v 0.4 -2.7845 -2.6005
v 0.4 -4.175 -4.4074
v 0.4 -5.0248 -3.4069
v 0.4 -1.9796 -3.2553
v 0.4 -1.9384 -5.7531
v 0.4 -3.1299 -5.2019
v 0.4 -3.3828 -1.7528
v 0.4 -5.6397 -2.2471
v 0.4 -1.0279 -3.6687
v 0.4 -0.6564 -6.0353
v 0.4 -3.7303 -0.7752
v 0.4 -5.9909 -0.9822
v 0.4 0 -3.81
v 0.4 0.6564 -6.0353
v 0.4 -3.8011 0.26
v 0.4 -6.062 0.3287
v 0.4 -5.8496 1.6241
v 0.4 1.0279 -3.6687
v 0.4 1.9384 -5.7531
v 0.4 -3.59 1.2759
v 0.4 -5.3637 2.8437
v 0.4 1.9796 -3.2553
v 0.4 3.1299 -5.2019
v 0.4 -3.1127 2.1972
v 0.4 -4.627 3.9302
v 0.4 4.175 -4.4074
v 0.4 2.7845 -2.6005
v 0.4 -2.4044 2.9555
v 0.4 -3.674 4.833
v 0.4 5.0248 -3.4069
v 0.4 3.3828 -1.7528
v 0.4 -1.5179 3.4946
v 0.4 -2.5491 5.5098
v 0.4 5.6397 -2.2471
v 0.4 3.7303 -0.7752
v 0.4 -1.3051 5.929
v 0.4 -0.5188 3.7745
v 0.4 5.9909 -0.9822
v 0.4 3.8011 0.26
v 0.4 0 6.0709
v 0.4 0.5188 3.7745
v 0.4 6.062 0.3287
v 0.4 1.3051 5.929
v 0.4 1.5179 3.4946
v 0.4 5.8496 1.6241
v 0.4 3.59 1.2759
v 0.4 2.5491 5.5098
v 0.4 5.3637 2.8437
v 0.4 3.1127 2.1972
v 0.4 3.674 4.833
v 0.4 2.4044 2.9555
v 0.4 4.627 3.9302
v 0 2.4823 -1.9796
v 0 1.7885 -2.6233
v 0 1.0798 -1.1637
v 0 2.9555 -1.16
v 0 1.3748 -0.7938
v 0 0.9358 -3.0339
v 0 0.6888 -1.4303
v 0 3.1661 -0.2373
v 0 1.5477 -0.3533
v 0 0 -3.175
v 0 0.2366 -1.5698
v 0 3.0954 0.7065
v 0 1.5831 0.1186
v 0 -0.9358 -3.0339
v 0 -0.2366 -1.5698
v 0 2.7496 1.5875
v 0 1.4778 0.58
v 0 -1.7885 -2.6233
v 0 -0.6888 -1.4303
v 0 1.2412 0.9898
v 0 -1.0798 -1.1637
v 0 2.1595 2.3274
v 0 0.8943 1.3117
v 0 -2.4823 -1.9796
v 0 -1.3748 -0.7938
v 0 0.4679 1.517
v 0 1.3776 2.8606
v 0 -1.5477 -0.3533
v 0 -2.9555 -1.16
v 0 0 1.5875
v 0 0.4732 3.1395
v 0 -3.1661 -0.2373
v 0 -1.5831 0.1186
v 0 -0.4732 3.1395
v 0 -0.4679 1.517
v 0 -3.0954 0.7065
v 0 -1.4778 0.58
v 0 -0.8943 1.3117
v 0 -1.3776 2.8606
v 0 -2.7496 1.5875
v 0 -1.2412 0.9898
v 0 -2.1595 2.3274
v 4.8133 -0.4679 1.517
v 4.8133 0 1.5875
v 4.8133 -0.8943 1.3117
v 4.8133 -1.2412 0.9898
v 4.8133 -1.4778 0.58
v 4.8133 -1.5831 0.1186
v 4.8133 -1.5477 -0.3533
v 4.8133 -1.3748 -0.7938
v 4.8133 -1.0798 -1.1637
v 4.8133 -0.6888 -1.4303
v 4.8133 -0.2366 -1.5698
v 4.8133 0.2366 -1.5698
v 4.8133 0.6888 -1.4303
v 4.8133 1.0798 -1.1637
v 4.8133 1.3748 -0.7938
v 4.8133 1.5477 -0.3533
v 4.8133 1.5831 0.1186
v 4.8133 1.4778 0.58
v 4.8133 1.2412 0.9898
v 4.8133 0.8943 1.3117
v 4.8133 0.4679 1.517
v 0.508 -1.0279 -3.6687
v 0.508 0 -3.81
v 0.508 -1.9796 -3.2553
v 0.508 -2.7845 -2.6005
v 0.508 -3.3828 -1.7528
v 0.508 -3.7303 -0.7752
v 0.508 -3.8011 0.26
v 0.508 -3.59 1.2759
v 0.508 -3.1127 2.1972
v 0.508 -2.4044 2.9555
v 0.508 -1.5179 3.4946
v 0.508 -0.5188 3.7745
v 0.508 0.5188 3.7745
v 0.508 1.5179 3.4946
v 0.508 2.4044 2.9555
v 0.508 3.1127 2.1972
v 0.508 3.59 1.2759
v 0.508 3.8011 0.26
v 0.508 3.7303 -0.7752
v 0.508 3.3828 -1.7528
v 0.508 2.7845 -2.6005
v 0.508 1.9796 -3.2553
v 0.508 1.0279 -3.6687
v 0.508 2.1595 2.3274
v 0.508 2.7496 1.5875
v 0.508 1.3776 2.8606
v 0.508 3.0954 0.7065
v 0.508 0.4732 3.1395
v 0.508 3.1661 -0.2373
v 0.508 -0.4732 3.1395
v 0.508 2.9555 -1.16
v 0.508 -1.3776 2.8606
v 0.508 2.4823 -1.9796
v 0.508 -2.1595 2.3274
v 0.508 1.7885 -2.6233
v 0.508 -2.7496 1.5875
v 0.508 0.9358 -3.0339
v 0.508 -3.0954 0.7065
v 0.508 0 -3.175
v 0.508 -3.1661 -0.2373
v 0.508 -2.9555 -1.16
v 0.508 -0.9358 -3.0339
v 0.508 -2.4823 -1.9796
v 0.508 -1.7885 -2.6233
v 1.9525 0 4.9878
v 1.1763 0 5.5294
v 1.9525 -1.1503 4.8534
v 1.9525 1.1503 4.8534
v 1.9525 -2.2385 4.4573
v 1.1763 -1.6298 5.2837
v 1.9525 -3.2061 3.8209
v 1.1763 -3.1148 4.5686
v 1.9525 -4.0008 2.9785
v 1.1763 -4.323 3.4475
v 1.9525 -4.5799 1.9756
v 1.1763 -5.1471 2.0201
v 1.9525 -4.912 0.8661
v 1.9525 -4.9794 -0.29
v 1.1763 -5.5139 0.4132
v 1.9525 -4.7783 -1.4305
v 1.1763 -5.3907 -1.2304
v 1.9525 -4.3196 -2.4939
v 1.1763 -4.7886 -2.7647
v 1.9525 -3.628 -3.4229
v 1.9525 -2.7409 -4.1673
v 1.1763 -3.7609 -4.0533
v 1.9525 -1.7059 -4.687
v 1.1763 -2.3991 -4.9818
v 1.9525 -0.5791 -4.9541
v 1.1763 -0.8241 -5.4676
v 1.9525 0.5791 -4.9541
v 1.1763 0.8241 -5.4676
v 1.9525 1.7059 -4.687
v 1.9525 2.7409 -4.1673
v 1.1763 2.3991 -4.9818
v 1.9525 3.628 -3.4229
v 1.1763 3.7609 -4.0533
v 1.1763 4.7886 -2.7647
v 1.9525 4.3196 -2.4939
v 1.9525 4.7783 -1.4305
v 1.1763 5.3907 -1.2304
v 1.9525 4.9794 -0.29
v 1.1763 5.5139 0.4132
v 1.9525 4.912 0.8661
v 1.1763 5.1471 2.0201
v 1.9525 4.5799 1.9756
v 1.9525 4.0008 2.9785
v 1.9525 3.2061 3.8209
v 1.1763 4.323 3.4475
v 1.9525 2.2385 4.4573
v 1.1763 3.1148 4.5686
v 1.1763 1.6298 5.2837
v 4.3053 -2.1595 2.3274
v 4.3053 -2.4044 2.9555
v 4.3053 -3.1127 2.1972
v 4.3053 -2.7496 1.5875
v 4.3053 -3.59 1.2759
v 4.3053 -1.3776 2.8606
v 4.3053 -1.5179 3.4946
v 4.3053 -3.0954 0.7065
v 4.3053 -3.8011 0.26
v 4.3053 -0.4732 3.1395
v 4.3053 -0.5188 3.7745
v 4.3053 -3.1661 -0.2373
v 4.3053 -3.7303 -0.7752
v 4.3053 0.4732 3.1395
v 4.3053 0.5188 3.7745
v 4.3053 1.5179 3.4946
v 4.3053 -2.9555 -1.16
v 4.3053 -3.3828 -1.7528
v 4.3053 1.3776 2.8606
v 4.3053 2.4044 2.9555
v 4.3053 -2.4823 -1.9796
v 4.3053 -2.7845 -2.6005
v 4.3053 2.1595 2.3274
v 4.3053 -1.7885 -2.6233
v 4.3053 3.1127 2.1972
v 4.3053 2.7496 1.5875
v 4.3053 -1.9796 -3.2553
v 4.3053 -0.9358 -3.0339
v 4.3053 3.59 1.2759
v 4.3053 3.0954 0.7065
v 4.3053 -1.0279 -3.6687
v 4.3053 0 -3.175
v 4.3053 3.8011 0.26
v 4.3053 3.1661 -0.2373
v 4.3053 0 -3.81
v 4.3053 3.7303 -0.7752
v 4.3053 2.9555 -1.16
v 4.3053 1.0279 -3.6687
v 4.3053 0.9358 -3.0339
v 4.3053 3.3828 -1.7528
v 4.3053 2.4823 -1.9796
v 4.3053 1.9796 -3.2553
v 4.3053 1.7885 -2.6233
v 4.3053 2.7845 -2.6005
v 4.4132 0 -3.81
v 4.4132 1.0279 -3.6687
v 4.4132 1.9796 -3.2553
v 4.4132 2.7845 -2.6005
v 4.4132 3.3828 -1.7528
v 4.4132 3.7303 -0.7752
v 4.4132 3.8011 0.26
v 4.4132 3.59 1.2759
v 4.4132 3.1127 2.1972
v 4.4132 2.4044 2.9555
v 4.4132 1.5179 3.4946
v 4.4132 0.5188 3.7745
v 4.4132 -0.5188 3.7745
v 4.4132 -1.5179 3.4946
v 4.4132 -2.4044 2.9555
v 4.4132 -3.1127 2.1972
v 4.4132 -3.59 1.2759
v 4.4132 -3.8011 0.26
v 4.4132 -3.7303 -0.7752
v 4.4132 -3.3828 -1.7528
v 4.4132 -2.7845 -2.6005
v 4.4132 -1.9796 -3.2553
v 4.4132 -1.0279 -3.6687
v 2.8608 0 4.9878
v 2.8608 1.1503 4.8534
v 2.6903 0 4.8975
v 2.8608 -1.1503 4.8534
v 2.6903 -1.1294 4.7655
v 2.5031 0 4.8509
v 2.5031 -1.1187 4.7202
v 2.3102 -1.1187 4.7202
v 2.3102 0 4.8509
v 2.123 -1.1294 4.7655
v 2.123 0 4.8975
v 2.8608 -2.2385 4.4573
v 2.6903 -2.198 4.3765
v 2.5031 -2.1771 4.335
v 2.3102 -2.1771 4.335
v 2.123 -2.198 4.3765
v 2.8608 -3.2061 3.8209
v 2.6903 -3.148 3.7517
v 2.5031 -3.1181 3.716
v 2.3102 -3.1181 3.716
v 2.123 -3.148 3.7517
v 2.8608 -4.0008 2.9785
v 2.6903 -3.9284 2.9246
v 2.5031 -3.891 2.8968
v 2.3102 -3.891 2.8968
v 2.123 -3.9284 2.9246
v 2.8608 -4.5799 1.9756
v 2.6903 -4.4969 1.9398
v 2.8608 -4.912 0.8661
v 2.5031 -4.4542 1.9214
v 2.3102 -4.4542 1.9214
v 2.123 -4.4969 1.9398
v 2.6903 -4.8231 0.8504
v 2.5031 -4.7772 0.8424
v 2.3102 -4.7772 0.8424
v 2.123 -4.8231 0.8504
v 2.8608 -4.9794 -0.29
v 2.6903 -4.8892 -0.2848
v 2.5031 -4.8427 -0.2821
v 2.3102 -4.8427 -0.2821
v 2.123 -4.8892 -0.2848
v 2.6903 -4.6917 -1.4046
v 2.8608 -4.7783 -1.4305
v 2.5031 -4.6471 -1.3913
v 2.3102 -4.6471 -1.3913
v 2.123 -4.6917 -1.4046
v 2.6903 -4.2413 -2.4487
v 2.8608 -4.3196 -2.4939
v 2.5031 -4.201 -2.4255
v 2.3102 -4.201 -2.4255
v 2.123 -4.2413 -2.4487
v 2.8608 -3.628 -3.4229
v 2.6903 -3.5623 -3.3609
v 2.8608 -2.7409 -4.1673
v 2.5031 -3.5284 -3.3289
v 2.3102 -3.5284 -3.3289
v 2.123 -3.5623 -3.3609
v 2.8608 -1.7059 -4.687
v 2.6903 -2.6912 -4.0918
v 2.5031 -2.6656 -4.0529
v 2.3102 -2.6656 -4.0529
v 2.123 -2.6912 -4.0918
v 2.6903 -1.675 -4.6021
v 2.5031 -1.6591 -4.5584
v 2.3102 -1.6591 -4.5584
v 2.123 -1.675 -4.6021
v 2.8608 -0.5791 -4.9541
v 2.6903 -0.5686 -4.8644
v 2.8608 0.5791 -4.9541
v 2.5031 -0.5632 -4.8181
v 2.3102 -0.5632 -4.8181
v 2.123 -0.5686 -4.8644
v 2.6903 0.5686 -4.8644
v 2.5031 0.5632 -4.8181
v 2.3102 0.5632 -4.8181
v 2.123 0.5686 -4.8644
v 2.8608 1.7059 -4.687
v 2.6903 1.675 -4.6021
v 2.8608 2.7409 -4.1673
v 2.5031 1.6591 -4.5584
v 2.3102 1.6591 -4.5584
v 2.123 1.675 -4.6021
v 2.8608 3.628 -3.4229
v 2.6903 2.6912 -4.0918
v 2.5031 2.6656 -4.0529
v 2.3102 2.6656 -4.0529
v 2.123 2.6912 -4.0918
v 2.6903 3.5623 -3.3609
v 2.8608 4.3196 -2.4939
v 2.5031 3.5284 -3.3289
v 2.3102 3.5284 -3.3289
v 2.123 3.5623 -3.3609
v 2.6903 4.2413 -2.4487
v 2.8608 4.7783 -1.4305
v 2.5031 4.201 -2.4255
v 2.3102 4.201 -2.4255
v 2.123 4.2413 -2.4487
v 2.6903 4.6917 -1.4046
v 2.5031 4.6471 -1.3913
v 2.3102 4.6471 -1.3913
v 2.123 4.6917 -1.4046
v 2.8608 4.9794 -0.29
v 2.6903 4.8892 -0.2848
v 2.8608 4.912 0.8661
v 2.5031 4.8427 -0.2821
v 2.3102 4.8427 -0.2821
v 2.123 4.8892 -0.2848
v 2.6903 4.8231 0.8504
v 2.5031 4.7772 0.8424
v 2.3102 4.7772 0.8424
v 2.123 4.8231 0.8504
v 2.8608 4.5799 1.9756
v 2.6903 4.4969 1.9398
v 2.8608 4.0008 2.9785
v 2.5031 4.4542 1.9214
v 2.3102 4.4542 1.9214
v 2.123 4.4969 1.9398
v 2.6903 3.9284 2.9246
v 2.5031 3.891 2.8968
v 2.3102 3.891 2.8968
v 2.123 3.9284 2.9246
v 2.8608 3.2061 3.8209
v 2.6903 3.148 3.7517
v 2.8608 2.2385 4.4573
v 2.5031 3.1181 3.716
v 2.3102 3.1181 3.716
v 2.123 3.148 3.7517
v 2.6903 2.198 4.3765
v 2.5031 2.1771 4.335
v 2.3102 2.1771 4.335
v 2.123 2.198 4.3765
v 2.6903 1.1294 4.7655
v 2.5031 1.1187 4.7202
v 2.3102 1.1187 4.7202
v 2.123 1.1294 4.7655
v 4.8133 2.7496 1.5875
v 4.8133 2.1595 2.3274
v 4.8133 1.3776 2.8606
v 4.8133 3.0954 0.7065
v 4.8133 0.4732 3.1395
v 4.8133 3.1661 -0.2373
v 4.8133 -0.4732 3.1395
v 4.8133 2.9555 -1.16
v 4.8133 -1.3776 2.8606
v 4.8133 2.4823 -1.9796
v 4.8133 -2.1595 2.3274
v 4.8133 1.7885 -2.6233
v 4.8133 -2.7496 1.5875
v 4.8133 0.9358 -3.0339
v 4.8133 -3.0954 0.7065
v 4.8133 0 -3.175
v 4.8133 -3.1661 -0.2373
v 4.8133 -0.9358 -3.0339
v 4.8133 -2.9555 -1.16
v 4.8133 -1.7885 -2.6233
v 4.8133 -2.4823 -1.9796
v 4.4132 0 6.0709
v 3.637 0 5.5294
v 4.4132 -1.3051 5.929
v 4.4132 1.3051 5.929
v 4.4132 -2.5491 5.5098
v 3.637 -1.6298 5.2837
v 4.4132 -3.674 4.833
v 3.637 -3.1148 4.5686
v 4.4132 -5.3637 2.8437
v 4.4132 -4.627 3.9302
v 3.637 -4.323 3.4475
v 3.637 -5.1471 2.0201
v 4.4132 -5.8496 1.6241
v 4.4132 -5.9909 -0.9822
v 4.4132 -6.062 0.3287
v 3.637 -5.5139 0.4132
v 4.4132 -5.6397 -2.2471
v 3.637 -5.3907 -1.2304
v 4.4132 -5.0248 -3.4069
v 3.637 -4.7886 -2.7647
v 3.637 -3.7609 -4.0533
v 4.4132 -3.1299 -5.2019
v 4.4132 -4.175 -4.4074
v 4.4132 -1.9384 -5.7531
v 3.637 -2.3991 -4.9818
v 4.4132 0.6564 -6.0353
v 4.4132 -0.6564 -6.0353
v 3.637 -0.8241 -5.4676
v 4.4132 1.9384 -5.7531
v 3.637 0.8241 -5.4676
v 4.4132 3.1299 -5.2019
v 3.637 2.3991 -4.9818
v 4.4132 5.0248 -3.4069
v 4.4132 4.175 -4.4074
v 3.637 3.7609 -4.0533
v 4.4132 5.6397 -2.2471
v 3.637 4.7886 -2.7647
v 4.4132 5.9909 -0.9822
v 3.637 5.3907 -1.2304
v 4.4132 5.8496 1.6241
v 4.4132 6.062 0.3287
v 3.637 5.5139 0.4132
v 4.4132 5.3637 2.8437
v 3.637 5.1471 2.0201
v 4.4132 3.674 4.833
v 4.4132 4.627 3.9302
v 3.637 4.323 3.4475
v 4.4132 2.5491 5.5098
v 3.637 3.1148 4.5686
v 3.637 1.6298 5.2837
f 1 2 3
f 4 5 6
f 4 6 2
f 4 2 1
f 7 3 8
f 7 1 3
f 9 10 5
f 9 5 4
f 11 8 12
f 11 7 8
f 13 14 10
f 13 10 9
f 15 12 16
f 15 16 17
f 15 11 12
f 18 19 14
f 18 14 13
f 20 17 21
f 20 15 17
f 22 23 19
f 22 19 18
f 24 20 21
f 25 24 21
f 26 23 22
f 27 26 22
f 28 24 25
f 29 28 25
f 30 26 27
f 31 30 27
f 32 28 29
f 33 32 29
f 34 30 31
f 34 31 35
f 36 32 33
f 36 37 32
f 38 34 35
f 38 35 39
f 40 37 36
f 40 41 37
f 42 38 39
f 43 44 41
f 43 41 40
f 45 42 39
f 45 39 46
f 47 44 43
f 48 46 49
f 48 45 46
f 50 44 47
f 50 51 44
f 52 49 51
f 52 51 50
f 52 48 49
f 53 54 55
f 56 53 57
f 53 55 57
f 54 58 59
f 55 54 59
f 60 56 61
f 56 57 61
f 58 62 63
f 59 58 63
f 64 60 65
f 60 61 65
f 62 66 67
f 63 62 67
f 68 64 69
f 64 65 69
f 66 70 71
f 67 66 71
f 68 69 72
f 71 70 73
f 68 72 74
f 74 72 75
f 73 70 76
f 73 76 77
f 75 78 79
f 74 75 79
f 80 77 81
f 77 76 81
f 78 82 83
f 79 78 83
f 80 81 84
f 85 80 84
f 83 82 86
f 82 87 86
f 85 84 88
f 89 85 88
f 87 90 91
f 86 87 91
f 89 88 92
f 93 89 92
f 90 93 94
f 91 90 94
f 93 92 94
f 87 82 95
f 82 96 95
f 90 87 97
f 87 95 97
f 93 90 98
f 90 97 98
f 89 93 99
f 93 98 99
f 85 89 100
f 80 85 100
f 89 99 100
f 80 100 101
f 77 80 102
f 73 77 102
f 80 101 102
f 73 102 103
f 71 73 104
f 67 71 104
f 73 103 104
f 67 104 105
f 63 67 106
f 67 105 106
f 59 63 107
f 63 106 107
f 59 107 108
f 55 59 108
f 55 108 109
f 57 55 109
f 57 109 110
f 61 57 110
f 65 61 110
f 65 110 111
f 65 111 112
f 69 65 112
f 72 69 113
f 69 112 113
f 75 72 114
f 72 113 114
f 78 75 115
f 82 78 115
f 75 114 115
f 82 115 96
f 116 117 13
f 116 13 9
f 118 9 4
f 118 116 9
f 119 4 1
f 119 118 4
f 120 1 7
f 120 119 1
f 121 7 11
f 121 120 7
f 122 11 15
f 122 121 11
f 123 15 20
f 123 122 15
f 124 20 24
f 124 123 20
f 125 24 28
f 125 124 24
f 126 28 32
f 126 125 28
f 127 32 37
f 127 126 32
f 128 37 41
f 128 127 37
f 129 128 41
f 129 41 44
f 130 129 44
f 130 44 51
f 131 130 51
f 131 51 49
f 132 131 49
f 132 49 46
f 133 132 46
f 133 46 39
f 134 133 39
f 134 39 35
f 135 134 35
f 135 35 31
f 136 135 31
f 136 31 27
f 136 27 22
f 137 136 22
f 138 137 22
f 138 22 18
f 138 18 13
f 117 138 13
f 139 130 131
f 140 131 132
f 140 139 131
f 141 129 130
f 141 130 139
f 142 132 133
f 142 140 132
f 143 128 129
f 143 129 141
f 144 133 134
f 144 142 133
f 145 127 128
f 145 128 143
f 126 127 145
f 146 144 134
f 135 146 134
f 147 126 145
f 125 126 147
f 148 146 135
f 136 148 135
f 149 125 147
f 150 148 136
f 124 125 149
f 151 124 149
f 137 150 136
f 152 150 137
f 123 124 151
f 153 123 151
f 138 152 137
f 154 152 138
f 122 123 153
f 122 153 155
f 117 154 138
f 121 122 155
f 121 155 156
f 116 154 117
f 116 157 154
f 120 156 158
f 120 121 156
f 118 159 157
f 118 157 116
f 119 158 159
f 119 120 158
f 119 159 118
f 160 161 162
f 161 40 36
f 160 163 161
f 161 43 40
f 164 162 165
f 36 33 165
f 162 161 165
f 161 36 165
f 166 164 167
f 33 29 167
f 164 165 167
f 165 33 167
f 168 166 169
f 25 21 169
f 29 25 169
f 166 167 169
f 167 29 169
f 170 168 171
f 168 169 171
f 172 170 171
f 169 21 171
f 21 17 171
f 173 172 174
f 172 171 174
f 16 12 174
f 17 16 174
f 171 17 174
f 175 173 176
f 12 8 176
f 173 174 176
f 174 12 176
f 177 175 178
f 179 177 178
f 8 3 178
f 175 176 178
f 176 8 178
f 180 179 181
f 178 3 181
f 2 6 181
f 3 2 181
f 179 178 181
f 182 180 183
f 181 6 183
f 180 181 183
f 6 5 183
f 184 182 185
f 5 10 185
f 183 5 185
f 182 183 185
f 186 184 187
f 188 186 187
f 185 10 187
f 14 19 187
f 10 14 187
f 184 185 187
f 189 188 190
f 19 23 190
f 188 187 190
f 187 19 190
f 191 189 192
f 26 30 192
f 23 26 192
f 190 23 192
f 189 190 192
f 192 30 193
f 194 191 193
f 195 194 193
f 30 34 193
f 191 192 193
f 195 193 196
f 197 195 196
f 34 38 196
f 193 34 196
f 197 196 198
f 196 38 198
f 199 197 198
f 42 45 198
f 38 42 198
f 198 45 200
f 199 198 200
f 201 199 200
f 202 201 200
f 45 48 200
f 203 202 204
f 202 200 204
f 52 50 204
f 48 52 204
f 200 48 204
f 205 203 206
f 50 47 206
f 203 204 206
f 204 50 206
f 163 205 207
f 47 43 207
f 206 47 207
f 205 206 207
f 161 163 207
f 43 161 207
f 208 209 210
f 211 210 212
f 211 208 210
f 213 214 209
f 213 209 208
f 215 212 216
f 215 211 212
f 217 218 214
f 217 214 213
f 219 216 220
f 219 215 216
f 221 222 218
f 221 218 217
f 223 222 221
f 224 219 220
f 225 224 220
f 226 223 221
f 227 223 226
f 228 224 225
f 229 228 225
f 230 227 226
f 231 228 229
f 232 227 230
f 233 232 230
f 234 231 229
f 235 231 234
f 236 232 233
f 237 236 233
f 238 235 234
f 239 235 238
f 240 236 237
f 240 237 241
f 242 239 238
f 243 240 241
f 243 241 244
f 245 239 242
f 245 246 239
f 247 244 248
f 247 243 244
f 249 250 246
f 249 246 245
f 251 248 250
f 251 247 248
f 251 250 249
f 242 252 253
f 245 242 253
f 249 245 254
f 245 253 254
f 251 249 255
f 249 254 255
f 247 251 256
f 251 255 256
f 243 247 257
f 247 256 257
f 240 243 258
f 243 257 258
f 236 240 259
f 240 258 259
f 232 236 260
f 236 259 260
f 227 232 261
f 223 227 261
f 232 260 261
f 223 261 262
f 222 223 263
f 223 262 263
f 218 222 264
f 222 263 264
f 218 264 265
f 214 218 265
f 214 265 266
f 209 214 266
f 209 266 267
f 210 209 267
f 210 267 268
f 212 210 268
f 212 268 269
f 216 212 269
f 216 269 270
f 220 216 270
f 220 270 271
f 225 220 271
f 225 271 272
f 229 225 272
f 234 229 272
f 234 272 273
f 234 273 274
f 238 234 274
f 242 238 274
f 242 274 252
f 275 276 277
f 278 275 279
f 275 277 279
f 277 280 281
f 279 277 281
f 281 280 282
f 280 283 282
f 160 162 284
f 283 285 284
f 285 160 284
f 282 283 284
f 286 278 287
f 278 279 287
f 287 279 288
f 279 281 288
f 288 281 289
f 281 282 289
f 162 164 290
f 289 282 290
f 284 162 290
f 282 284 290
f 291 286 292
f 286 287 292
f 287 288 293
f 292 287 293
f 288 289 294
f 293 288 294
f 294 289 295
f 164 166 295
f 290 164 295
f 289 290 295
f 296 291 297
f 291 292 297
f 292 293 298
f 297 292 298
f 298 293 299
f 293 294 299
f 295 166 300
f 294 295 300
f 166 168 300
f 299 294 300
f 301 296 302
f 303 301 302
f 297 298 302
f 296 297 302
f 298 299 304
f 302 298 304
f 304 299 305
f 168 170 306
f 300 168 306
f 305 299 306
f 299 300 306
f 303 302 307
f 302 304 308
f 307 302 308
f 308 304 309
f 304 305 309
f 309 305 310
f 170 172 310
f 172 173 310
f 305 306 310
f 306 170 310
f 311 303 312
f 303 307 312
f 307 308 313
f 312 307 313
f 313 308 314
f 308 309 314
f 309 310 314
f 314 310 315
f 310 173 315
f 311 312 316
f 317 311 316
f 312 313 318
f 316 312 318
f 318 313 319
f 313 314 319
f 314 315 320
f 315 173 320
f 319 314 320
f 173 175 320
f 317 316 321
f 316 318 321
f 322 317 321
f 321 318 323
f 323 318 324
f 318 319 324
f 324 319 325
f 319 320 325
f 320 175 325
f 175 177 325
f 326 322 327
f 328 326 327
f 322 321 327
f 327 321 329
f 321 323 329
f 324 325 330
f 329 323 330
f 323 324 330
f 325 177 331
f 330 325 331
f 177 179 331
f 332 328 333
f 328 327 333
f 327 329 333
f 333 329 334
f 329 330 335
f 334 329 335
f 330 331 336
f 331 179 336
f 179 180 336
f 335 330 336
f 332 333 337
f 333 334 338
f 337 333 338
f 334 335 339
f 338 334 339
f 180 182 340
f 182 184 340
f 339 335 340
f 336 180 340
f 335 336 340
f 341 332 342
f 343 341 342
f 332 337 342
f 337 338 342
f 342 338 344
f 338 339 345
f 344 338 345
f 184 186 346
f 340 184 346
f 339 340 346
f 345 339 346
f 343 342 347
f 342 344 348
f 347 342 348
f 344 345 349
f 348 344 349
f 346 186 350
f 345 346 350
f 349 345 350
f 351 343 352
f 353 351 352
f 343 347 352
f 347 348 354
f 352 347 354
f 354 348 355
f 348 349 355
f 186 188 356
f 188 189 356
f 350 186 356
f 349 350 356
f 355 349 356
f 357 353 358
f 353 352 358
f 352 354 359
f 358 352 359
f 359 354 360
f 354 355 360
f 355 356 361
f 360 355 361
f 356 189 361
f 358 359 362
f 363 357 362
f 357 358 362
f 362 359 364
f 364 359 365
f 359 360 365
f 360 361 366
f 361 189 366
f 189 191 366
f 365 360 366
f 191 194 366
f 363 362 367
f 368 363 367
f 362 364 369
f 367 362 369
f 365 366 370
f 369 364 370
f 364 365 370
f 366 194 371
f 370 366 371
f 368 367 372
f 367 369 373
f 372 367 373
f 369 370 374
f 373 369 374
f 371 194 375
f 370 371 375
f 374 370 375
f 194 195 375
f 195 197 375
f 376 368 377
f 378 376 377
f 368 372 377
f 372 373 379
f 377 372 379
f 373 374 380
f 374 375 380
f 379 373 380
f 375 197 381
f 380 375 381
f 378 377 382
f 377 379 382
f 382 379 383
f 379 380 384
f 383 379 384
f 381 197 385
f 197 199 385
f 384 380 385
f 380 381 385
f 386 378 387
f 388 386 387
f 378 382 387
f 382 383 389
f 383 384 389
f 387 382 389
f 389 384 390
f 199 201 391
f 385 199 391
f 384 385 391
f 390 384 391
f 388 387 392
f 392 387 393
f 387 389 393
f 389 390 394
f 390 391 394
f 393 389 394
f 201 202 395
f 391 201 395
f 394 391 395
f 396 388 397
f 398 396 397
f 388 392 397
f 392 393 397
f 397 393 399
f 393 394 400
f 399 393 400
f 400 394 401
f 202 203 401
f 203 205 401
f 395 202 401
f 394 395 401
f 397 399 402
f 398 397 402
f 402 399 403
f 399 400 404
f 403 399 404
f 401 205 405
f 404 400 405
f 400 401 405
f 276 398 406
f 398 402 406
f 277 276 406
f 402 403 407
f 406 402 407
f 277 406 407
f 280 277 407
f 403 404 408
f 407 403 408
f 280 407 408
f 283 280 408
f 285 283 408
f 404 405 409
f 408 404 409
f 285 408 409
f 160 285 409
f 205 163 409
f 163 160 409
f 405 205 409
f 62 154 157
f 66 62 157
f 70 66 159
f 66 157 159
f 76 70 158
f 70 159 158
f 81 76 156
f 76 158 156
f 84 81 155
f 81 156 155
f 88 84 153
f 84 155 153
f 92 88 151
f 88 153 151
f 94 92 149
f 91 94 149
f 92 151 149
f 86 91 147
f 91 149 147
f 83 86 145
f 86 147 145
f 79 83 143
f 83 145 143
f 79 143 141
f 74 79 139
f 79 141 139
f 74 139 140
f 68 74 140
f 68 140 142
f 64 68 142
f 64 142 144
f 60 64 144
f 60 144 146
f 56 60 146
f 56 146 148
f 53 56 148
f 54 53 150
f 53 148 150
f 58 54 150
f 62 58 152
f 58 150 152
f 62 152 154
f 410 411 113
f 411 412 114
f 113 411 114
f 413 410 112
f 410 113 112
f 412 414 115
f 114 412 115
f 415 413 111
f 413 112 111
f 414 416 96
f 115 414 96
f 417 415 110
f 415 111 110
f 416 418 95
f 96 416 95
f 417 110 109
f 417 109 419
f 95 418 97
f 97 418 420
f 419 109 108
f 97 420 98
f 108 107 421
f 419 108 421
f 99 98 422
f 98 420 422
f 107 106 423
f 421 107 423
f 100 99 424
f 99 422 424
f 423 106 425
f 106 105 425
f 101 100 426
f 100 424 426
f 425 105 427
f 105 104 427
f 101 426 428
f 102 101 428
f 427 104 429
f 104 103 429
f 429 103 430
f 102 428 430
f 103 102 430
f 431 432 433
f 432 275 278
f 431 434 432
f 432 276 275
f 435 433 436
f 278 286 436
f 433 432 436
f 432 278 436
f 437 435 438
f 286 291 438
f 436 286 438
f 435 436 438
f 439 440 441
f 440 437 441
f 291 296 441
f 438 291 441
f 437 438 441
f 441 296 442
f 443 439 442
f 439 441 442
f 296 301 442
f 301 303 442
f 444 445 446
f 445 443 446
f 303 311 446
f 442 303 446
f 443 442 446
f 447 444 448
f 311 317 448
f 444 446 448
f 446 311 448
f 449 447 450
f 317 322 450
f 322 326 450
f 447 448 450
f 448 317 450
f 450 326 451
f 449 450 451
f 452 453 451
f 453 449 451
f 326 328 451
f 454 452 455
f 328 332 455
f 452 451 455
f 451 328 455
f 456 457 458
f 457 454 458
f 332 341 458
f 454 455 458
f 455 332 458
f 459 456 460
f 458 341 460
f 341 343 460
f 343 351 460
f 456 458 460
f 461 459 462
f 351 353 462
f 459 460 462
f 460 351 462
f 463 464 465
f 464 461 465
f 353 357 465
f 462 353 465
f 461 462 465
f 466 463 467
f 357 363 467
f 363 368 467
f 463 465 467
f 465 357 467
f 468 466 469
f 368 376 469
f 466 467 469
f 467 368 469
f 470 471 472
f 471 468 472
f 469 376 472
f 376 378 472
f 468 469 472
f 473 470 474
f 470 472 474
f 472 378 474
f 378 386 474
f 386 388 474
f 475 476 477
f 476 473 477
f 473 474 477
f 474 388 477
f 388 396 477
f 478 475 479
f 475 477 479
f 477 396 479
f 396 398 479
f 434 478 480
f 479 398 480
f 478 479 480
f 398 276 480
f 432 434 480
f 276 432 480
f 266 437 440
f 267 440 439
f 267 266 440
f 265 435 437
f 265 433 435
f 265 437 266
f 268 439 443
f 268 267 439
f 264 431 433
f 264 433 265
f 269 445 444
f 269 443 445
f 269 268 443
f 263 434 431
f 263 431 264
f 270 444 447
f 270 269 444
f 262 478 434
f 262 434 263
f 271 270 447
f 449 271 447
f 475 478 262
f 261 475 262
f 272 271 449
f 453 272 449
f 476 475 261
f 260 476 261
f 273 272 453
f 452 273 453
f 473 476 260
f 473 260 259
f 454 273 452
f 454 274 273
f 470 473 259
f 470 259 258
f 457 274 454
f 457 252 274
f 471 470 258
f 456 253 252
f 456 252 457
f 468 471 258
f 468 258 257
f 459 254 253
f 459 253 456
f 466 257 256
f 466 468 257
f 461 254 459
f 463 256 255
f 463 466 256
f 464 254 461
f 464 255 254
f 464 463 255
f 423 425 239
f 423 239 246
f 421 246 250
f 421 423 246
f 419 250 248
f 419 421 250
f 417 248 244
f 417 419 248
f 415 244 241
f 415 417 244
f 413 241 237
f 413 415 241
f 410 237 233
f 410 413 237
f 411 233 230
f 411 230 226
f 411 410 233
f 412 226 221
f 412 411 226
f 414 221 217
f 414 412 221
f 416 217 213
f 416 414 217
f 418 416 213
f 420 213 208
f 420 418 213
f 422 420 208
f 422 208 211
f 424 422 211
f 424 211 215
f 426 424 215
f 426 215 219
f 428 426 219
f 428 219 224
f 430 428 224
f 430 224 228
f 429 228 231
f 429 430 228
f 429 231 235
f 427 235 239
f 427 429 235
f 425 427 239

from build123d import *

# Parameters (mm, degrees)
SKETCH4_R          = 3.81
SKETCH4_R_2        = 3.175
CUT_EXTRUDE1_DEPTH = 0.508
CUT_EXTRUDE2_START = -0.508
SKETCH5_R          = 3.81
SKETCH5_R_2        = 3.175
CUT_EXTRUDE2_DEPTH = 0.508
SKETCH7_R          = 6.35
SKETCH7_R_2        = 3.81
CUT_EXTRUDE3_DEPTH = 0.40005
CUT_EXTRUDE4_START = -0.40005
SKETCH8_R          = 6.35
SKETCH8_R_2        = 3.81
CUT_EXTRUDE4_DEPTH = 0.40005


with BuildPart() as part:
    # Sketch1 → Revolve1 (revolve)
    with BuildSketch(Plane.XY, mode=Mode.PRIVATE) as revolve1_sk:
        with BuildLine():
            Line((0, 1.5875), (4.8133, 1.5875))
            Line((4.8133, 1.5875), (4.8133, 6.35))
            Line((4.8133, 6.35), (2.860814617, 4.987821073))
            ThreePointArc((2.860814617, 4.987821073), (2.40665, 4.84505), (1.952485383, 4.987821073))
            Line((1.952485383, 4.987821073), (0, 6.35))
            Line((0, 6.35), (0, 1.5875))
        make_face()
    revolve(revolve1_sk.sketch.rotate(Axis((0, 0, 0), (1, 0, 0)), 90), axis=Axis((0, 0, 0), (1, 0, 0)))

    # Sketch4 → Cut-Extrude1 (cut)
    with BuildSketch(Plane(origin=(4.8133, 0, 0), x_dir=(0, 0, -1), z_dir=(1, 0, 0))):
        Circle(SKETCH4_R)
        Circle(SKETCH4_R_2, mode=Mode.SUBTRACT)
    extrude(amount=-CUT_EXTRUDE1_DEPTH, mode=Mode.SUBTRACT)

    # Sketch5 → Cut-Extrude2 (cut)
    with BuildSketch(Plane.ZY.offset(CUT_EXTRUDE2_START)):
        with Locations(Location((0, 0, 0), (0, 0, 180))):
            Circle(SKETCH5_R)
        with Locations(Location((0, 0, 0), (0, 0, 180))):
            Circle(SKETCH5_R_2, mode=Mode.SUBTRACT)
    extrude(amount=CUT_EXTRUDE2_DEPTH, mode=Mode.SUBTRACT)

    # Sketch7 → Cut-Extrude3 (cut)
    with BuildSketch(Plane(origin=(4.8133, 0, 0), x_dir=(0, 0, -1), z_dir=(1, 0, 0))):
        Circle(SKETCH7_R)
        Circle(SKETCH7_R_2, mode=Mode.SUBTRACT)
    extrude(amount=-CUT_EXTRUDE3_DEPTH, mode=Mode.SUBTRACT)

    # Sketch8 → Cut-Extrude4 (cut)
    with BuildSketch(Plane.ZY.offset(CUT_EXTRUDE4_START)):
        Circle(SKETCH8_R)
        Circle(SKETCH8_R_2, mode=Mode.SUBTRACT)
    extrude(amount=CUT_EXTRUDE4_DEPTH, mode=Mode.SUBTRACT)


solid = part.part
